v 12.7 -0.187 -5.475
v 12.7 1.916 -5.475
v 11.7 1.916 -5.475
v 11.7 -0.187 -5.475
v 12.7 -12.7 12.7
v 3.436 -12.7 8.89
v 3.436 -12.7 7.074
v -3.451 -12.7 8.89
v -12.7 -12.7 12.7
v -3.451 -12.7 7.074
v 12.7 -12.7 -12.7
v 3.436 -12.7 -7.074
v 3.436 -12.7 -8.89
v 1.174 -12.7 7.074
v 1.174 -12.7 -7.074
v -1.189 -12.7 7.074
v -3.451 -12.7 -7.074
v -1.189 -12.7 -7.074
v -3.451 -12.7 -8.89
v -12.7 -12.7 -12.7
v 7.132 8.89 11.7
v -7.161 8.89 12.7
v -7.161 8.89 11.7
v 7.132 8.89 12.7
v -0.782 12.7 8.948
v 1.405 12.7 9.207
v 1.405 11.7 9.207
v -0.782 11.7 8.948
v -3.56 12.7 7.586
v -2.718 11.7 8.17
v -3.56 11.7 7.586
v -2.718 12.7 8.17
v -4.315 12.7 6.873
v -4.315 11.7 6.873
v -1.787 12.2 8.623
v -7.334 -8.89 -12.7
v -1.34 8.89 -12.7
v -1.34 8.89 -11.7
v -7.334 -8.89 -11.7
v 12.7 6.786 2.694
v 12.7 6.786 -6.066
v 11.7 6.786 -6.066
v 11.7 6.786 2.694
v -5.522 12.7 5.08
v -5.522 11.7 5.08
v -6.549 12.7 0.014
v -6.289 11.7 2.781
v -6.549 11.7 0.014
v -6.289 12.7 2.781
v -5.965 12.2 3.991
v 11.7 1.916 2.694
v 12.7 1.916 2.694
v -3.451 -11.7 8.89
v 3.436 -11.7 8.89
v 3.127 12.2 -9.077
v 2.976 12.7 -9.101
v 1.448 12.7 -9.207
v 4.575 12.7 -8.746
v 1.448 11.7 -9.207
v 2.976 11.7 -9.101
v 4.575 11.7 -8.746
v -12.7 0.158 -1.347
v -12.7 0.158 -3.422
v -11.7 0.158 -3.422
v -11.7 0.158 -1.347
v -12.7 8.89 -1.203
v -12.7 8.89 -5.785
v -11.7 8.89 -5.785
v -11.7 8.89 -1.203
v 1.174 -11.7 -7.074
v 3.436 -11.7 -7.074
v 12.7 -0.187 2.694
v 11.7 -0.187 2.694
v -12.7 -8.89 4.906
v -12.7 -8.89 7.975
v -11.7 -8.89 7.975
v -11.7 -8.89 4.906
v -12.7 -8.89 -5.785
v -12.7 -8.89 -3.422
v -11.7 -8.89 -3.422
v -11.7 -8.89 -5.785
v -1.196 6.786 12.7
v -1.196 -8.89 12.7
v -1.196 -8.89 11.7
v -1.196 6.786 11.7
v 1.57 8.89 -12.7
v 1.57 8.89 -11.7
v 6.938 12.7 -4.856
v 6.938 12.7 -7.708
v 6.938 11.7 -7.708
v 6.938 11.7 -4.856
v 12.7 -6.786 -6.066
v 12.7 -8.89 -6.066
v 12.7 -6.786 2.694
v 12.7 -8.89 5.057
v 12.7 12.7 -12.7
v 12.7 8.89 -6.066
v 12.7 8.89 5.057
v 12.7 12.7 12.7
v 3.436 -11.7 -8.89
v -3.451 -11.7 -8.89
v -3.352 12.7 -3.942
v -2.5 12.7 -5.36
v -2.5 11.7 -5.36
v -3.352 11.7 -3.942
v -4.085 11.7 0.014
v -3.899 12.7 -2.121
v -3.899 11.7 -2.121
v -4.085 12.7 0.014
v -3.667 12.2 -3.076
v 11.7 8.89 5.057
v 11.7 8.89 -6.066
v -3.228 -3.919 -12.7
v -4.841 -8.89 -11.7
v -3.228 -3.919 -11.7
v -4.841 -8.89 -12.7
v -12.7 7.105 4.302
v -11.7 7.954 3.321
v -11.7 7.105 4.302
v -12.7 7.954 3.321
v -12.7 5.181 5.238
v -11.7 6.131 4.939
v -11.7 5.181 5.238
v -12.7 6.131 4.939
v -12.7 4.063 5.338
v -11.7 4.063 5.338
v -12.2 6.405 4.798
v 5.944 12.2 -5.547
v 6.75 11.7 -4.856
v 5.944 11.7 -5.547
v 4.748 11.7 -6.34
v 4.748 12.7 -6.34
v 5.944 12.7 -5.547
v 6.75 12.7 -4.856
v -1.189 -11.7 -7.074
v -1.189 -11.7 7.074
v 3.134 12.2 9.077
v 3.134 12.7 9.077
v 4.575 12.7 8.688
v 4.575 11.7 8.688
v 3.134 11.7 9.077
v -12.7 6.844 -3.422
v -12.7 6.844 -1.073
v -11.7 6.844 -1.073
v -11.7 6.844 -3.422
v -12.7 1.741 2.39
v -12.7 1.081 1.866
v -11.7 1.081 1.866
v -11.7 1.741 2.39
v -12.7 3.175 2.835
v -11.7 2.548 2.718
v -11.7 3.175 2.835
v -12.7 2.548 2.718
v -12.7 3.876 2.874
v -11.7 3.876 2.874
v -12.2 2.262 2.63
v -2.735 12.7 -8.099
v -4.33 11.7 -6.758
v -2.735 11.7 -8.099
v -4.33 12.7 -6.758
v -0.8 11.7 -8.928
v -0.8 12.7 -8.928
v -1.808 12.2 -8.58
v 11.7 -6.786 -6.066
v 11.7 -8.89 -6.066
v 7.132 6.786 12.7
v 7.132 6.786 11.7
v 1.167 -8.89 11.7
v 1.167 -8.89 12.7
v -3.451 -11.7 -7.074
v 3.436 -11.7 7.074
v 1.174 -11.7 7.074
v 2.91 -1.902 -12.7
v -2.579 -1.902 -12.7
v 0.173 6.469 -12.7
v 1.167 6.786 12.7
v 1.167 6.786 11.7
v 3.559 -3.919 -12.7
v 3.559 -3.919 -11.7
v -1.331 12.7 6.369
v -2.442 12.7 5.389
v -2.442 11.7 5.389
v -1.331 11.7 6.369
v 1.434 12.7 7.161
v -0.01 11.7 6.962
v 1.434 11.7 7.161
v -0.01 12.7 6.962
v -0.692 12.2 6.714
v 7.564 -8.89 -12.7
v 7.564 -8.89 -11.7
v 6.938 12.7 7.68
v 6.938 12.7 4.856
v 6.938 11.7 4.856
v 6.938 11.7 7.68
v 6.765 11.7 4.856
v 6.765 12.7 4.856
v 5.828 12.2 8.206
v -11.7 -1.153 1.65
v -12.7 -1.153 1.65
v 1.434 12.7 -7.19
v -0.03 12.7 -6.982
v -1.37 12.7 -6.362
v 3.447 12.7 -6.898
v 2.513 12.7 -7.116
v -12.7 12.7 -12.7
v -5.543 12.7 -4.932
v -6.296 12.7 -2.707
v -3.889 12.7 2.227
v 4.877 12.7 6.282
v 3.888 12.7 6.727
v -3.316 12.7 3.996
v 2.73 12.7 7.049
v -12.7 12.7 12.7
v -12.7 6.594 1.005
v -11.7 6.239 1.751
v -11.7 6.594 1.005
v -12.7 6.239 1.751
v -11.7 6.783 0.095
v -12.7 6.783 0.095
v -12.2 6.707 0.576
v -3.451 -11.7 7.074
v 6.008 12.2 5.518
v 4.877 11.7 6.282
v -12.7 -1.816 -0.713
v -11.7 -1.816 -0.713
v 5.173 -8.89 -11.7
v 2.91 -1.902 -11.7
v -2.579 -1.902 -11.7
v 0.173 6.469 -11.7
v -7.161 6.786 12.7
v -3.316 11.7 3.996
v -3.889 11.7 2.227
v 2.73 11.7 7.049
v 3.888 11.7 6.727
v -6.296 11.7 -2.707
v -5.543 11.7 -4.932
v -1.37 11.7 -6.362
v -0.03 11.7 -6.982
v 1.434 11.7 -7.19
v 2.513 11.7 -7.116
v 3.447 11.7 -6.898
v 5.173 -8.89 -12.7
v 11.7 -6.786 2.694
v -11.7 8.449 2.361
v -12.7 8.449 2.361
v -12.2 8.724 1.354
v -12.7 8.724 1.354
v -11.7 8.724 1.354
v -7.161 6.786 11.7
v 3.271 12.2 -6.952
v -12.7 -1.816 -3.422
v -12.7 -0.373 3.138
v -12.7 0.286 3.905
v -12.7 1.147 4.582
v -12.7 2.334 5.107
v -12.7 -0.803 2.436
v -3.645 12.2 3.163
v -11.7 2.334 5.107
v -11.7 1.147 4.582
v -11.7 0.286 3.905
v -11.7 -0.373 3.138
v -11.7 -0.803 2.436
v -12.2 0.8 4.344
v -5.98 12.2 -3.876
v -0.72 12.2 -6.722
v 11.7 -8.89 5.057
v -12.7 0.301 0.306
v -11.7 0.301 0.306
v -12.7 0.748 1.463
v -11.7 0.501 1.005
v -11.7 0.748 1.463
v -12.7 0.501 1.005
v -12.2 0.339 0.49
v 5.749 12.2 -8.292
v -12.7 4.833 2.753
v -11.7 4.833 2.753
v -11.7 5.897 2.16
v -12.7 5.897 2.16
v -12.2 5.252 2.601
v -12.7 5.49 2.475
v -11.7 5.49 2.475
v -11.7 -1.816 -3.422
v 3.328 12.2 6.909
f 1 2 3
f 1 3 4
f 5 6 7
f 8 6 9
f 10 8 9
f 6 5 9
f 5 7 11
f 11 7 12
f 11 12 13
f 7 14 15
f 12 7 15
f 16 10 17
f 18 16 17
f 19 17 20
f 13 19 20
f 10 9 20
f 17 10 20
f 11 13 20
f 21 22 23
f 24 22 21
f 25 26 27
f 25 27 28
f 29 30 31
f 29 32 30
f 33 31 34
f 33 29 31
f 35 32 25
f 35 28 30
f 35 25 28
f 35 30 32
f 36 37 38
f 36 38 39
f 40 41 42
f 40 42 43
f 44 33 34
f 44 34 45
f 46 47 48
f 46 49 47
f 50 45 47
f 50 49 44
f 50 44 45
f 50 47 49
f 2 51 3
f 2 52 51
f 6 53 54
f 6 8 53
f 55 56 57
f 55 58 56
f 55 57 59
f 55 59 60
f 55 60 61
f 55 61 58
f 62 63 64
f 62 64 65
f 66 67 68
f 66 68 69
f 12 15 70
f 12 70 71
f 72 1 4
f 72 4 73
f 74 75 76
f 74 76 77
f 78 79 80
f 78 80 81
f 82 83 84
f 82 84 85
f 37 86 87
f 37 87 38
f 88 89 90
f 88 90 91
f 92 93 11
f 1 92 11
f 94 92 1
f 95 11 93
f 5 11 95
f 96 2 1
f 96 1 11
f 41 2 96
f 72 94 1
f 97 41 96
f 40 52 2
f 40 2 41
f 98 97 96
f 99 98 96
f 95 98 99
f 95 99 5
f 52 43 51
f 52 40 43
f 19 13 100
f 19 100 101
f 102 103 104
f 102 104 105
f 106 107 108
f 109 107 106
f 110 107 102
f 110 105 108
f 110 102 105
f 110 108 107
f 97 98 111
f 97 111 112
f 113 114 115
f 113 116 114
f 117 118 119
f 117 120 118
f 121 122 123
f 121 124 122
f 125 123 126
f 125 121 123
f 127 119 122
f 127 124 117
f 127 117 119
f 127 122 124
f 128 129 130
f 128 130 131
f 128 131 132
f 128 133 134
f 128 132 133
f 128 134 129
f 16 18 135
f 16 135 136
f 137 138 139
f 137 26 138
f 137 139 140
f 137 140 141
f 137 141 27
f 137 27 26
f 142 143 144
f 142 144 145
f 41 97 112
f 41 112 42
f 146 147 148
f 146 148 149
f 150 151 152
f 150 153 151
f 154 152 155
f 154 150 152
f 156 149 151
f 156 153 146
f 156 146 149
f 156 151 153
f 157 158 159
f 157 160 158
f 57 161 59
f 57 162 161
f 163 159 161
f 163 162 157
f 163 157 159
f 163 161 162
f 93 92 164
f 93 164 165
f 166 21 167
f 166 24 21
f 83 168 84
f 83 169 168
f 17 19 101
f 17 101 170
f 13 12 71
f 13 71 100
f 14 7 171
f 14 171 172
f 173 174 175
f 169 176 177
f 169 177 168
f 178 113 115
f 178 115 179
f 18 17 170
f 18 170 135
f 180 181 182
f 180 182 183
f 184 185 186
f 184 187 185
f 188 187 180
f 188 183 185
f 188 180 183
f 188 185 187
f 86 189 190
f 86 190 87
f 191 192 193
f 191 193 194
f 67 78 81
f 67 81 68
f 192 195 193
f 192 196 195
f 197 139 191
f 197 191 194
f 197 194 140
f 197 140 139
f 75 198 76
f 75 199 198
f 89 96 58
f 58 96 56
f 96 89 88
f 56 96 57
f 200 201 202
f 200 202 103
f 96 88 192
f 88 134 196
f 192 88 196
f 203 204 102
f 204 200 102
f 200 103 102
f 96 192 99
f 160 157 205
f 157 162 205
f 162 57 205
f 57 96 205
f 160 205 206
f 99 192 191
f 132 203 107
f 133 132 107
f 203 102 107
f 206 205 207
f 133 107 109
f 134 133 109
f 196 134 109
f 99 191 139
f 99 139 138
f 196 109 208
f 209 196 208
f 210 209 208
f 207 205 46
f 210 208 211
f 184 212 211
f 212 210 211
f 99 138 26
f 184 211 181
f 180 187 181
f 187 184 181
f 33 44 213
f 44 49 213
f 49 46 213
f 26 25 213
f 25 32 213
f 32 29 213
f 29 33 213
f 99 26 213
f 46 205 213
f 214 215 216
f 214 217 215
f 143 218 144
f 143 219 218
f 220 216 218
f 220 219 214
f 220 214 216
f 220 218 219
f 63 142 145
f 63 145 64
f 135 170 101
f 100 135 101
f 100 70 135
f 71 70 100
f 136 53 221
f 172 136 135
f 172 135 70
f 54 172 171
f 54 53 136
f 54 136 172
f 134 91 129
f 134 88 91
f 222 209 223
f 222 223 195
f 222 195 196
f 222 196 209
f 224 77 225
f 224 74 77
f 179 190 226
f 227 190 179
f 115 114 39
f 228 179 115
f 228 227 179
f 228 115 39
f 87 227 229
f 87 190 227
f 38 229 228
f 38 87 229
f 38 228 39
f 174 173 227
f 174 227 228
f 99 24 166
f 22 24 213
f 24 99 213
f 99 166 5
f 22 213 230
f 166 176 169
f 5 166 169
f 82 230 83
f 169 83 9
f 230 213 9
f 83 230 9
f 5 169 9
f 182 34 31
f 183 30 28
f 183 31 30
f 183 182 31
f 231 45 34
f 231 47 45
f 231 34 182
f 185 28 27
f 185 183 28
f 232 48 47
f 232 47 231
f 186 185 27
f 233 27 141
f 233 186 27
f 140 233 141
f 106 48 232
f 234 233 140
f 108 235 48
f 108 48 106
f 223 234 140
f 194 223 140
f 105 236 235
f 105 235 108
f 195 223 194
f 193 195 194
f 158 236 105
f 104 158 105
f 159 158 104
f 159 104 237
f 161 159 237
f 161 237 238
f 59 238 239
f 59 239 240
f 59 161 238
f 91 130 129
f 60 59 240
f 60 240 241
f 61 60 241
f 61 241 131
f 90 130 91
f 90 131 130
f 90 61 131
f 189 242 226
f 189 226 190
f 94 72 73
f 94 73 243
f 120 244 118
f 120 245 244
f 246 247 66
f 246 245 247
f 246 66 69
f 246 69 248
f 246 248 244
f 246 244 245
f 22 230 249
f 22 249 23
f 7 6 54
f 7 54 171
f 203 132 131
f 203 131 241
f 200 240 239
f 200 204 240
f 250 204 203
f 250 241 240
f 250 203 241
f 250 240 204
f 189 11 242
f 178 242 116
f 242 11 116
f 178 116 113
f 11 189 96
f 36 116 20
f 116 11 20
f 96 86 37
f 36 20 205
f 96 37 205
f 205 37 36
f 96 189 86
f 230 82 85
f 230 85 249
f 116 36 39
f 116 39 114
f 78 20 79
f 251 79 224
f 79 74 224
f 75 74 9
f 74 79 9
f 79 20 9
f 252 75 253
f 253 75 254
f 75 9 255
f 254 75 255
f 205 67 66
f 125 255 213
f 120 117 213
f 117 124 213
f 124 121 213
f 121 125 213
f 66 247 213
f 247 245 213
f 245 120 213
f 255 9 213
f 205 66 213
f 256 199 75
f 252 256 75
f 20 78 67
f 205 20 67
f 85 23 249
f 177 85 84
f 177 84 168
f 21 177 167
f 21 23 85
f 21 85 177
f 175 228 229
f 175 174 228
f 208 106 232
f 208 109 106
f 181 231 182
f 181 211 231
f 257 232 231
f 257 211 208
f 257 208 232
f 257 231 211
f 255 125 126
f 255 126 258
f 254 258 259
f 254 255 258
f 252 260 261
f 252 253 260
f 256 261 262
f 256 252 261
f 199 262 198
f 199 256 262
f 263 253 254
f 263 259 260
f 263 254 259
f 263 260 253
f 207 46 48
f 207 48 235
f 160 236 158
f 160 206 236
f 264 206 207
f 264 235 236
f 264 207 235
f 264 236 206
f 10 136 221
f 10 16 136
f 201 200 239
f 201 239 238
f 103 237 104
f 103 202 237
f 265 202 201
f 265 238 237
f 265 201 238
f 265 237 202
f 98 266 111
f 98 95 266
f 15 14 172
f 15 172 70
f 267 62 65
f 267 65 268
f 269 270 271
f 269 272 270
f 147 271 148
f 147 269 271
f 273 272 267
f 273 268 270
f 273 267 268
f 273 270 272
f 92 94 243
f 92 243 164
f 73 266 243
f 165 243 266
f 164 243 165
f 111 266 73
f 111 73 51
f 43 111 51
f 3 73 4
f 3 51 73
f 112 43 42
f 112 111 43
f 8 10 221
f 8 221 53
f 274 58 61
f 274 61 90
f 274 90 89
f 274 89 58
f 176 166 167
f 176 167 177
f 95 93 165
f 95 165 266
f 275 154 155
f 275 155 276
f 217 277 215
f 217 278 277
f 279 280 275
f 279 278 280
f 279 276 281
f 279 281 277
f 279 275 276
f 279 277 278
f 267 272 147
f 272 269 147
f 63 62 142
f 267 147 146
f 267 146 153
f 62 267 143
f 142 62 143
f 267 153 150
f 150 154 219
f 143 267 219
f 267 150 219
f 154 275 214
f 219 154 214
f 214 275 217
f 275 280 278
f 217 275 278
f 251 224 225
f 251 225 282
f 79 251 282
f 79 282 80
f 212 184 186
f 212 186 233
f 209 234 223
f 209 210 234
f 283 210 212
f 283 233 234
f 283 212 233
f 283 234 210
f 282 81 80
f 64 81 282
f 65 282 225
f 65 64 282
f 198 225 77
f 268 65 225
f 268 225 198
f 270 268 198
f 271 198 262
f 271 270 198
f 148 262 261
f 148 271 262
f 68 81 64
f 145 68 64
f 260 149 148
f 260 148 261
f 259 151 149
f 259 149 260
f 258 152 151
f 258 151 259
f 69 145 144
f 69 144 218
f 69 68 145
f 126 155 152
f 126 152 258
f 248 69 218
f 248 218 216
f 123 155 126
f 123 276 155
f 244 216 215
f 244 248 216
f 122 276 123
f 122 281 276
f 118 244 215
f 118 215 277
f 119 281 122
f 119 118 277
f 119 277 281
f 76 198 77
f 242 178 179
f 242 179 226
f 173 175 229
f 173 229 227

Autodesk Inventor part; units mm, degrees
ref_plane "YZ Plane" through (0, 0, 0) normal (1, 0, 0) x (0, 1, 0)
ref_plane "XZ Plane" through (0, 0, 0) normal (0, 1, 0) x (-1, 0, 0)
ref_plane "XY Plane" through (0, 0, 0) normal (0, 0, 1) x (1, 0, 0)
sketch "sqr_sketch" plane through (0, 0, 0) normal (1, 0, 0) x (0, 1, 0)
  line L0 (12.7, 12.7) -> (-12.7, 12.7)
  line L1 (-12.7, 12.7) -> (-12.7, -12.7)
  line L2 (-12.7, -12.7) -> (12.7, -12.7)
  line L3 (12.7, -12.7) -> (12.7, 12.7)
  line L4 (12.7, 12.7) -> (-12.7, -12.7) construction
  line L5 (-12.7, 12.7) -> (12.7, -12.7) construction
  point P0 (0, 0)
  dimension "d0" = 25.4
extrude "sqr_extrusion" add sketch "sqr_sketch" along normal mid plane 25.4
sketch "T_sketch" plane through (-12.7, -12.7, 12.7) normal (0, 0, 1) x (1, 0, 0)
  line L0 (5.5534, 21.59) -> (19.8466, 21.59) construction
  line L1 (19.8466, 21.59) -> (19.8466, 3.81) construction
  line L2 (19.8466, 3.81) -> (5.5534, 3.81) construction
  line L3 (5.5534, 3.81) -> (5.5534, 21.59) construction
  line L4 (12.7, 21.59) -> (12.7, 3.81) construction
  line L5 (11.5041, 3.81) -> (11.5041, 19.4864)
  line L6 (11.5041, 19.4864) -> (5.539, 19.4864)
  line L7 (5.539, 19.4864) -> (5.539, 21.59)
  line L8 (5.539, 21.59) -> (19.8322, 21.59)
  line L9 (19.8322, 21.59) -> (19.8322, 19.4864)
  line L10 (19.8322, 19.4864) -> (13.8671, 19.4864)
  line L11 (13.8671, 19.4864) -> (13.8671, 3.81)
  line L12 (13.8671, 3.81) -> (11.5041, 3.81)
  point P0 (12.7, 12.7)
  point P1 (12.7, 12.7)
  point P2 (5.5534, 12.7)
  point P3 (19.8466, 12.7)
  dimension "d17" = 17.78
  dimension "d18" = 14.2932
extrude "T_extrusion" cut sketch "T_sketch" against normal blind 1
sketch "E_sketch" plane through (12.7, 0, 0) normal (1, 0, 0) x (0, 0, -1)
  line L0 (-6.8584, 8.89) -> (6.8584, 8.89) construction
  line L1 (6.8584, 8.89) -> (6.8584, -8.89) construction
  line L2 (6.8584, -8.89) -> (-6.8584, -8.89) construction
  line L3 (-6.8584, -8.89) -> (-6.8584, 8.89) construction
  line L4 (0, 8.89) -> (0, -8.89) construction
  line L5 (-5.0574, -8.89) -> (-5.0574, 8.89)
  line L6 (-5.0574, 8.89) -> (6.0659, 8.89)
  line L7 (6.0659, 8.89) -> (6.0659, 6.7864)
  line L8 (6.0659, 6.7864) -> (-2.6944, 6.7864)
  line L9 (-2.6944, 6.7864) -> (-2.6944, 1.9163)
  line L10 (-2.6944, 1.9163) -> (5.4752, 1.9163)
  line L11 (5.4752, 1.9163) -> (5.4752, -0.1873)
  line L12 (5.4752, -0.1873) -> (-2.6944, -0.1873)
  line L13 (-2.6944, -0.1873) -> (-2.6944, -6.7864)
  line L14 (-2.6944, -6.7864) -> (6.0659, -6.7864)
  line L15 (6.0659, -6.7864) -> (6.0659, -8.89)
  line L16 (6.0659, -8.89) -> (-5.0574, -8.89)
  point P0 (0, 0)
  point P1 (0, 0)
  point P2 (-6.8584, 0)
  point P3 (6.8584, 0)
  dimension "d15" = 17.78
  dimension "d16" = 13.7168
extrude "E_extrusion" cut sketch "E_sketch" against normal blind 1
sketch "A_sketch" plane through (12.7, 12.7, -12.7) normal (0, 0, -1) x (-1, 0, 0)
  line L0 (5.2508, -3.81) -> (20.1492, -3.81) construction
  line L1 (20.1492, -3.81) -> (20.1492, -21.59) construction
  line L2 (20.1492, -21.59) -> (5.2508, -21.59) construction
  line L3 (5.2508, -21.59) -> (5.2508, -3.81) construction
  line L4 (12.7, -3.81) -> (12.7, -21.59) construction
  line L5 (5.1356, -21.59) -> (11.1295, -3.81)
  line L6 (11.1295, -3.81) -> (14.04, -3.81)
  line L7 (14.04, -3.81) -> (20.0339, -21.59)
  line L8 (20.0339, -21.59) -> (17.5412, -21.59)
  line L9 (17.5412, -21.59) -> (15.9275, -16.6191)
  line L10 (15.9275, -16.6191) -> (9.1411, -16.6191)
  line L11 (9.1411, -16.6191) -> (7.5274, -21.59)
  line L12 (7.5274, -21.59) -> (5.1356, -21.59)
  line L13 (15.2791, -14.6019) -> (12.5271, -6.2306)
  line L14 (12.5271, -6.2306) -> (9.7895, -14.6019)
  line L15 (9.7895, -14.6019) -> (15.2791, -14.6019)
  point P0 (12.7, -12.7)
  point P1 (5.2508, -12.7)
  point P2 (20.1492, -12.7)
  point P3 (12.7, -12.7)
  dimension "d19" = 17.78
  dimension "d20" = 14.8983
extrude "A_extrusion" cut sketch "A_sketch" against normal blind 1
sketch "R_sketch" plane through (-12.7, 0, 0) normal (-1, 0, 0) x (0, 0, 1)
  line L0 (-7.586, 8.89) -> (7.586, 8.89) construction
  line L1 (7.586, 8.89) -> (7.586, -8.89) construction
  line L2 (7.586, -8.89) -> (-7.586, -8.89) construction
  line L3 (-7.586, -8.89) -> (-7.586, 8.89) construction
  line L4 (0, 8.89) -> (0, -8.89) construction
  line L5 (7.9751, -8.89) -> (4.9061, -8.89)
  line L6 (4.9061, -8.89) -> (-0.7132, -1.8155)
  line L7 (-0.7132, -1.8155) -> (-3.422, -1.8155)
  line L8 (-3.422, -1.8155) -> (-3.422, -8.89)
  line L9 (-3.422, -8.89) -> (-5.785, -8.89)
  line L10 (-5.785, -8.89) -> (-5.785, 8.89)
  line L11 (-5.785, 8.89) -> (-1.2031, 8.89)
  spline S0 degree 2 poles (-1.2031, 8.89) (0.3242, 8.89) (2.3846, 8.5586) (3.3211, 7.9535) knots 0 0 0 1 2 2 2
  spline S1 degree 2 poles (3.3211, 7.9535) (4.2577, 7.3483) (5.3383, 5.4608) (5.3383, 4.0632) knots 0 0 0 1 2 2 2
  spline S2 degree 2 poles (5.3383, 4.0632) (5.3383, 2.118) (3.35, -0.5187) (1.6498, -1.1527) knots 0 0 0 1 2 2 2
  line L12 (1.6498, -1.1527) -> (7.9751, -8.89)
  spline S3 degree 2 poles (2.8745, 3.8759) (2.8745, 4.6539) (2.327, 5.8498) (1.7506, 6.2388) knots 0 0 0 1 2 2 2
  spline S4 degree 2 poles (1.7506, 6.2388) (1.2463, 6.5702) (-0.0937, 6.844) (-1.0734, 6.844) knots 0 0 0 1 2 2 2
  line L13 (-1.0734, 6.844) -> (-3.422, 6.844)
  line L14 (-3.422, 6.844) -> (-3.422, 0.1585)
  line L15 (-3.422, 0.1585) -> (-1.3472, 0.1585)
  spline S5 degree 2 poles (-1.3472, 0.1585) (-0.3242, 0.1585) (1.304, 0.5187) (1.8659, 1.0806) knots 0 0 0 1 2 2 2
  spline S6 degree 2 poles (1.8659, 1.0806) (2.3846, 1.5705) (2.8745, 2.9537) (2.8745, 3.8759) knots 0 0 0 1 2 2 2
  point P0 (0, 0)
  point P1 (0, 0)
  point P2 (-7.586, 0)
  point P3 (7.586, 0)
  dimension "d21" = 17.78
  dimension "d22" = 15.1721
extrude "R_extrusion" cut sketch "R_sketch" against normal blind 1
sketch "C_sketch" plane through (-12.7, 12.7, 12.7) normal (0, 1, 0) x (1, 0, 0)
  line L0 (5.3589, 21.907) -> (20.0411, 21.907) construction
  line L1 (20.0411, 21.907) -> (20.0411, 3.493) construction
  line L2 (20.0411, 3.493) -> (5.3589, 3.493) construction
  line L3 (5.3589, 3.493) -> (5.3589, 21.907) construction
  line L4 (12.7, 21.907) -> (12.7, 3.493) construction
  spline S0 degree 2 poles (14.1048, 3.493) (12.3758, 3.493) (9.4509, 4.6601) (8.3847, 5.8272) knots 0 0 0 1 2 2 2
  spline S1 degree 2 poles (8.3847, 5.8272) (7.3185, 6.9799) (6.1514, 10.4379) (6.1514, 12.6856) knots 0 0 0 1 2 2 2
  spline S2 degree 2 poles (6.1514, 12.6856) (6.1514, 14.9189) (7.2896, 18.2328) (8.3703, 19.4576) knots 0 0 0 1 2 2 2
  spline S3 degree 2 poles (8.3703, 19.4576) (9.4365, 20.6535) (12.347, 21.907) (14.148, 21.907) knots 0 0 0 1 2 2 2
  spline S4 degree 2 poles (14.148, 21.907) (15.0414, 21.907) (16.6119, 21.6476) (17.2747, 21.4459) knots 0 0 0 1 2 2 2
  spline S5 degree 2 poles (17.2747, 21.4459) (17.851, 21.2586) (19.0469, 20.7255) (19.6377, 20.4085) knots 0 0 0 1 2 2 2
  line L5 (19.6377, 20.4085) -> (19.6377, 17.5556)
  line L6 (19.6377, 17.5556) -> (19.4503, 17.5556)
  spline S6 degree 2 poles (19.4503, 17.5556) (19.1334, 17.8438) (18.1536, 18.6507) (17.4476, 19.0397) knots 0 0 0 1 2 2 2
  spline S7 degree 2 poles (17.4476, 19.0397) (16.7704, 19.4143) (15.171, 19.8898) (14.1336, 19.8898) knots 0 0 0 1 2 2 2
  spline S8 degree 2 poles (14.1336, 19.8898) (12.9954, 19.8898) (10.9638, 18.9533) (10.2001, 18.0599) knots 0 0 0 1 2 2 2
  spline S9 degree 2 poles (10.2001, 18.0599) (9.4509, 17.1522) (8.6152, 14.4002) (8.6152, 12.6856) knots 0 0 0 1 2 2 2
  spline S10 degree 2 poles (8.6152, 12.6856) (8.6152, 10.8557) (9.4941, 8.219) (10.2578, 7.3112) knots 0 0 0 1 2 2 2
  spline S11 degree 2 poles (10.2578, 7.3112) (11.007, 6.4323) (13.0098, 5.539) (14.1336, 5.539) knots 0 0 0 1 2 2 2
  spline S12 degree 2 poles (14.1336, 5.539) (15.1566, 5.539) (16.9001, 6.0433) (17.5773, 6.4179) knots 0 0 0 1 2 2 2
  spline S13 degree 2 poles (17.5773, 6.4179) (18.2256, 6.7925) (19.191, 7.5706) (19.4648, 7.8444) knots 0 0 0 1 2 2 2
  line L7 (19.4648, 7.8444) -> (19.6377, 7.8444)
  line L8 (19.6377, 7.8444) -> (19.6377, 5.0203)
  spline S14 degree 2 poles (19.6377, 5.0203) (19.0469, 4.7465) (18.0095, 4.2423) (17.2747, 4.0117) knots 0 0 0 1 2 2 2
  spline S15 degree 2 poles (17.2747, 4.0117) (16.4966, 3.7524) (15.171, 3.493) (14.1048, 3.493) knots 0 0 0 1 2 2 2
  point P0 (12.7, 12.7)
  point P1 (5.3589, 12.7)
  point P2 (20.0411, 12.7)
  point P3 (12.7, 12.7)
  dimension "d23" = 18.414
  dimension "d24" = 14.6822
extrude "C_extrusion" cut sketch "C_sketch" against normal blind 1
sketch "I_sketch" plane through (-12.7, -12.7, -12.7) normal (0, -1, 0) x (1, 0, 0)
  line L0 (8.1397, 21.59) -> (17.2603, 21.59) construction
  line L1 (17.2603, 21.59) -> (17.2603, 3.81) construction
  line L2 (17.2603, 3.81) -> (8.1397, 3.81) construction
  line L3 (8.1397, 3.81) -> (8.1397, 21.59) construction
  line L4 (12.7, 3.81) -> (12.7, 21.59) construction
  line L5 (16.1364, 3.81) -> (9.2492, 3.81)
  line L6 (9.2492, 3.81) -> (9.2492, 5.6255)
  line L7 (9.2492, 5.6255) -> (11.5113, 5.6255)
  line L8 (11.5113, 5.6255) -> (11.5113, 19.7745)
  line L9 (11.5113, 19.7745) -> (9.2492, 19.7745)
  line L10 (9.2492, 19.7745) -> (9.2492, 21.59)
  line L11 (9.2492, 21.59) -> (16.1364, 21.59)
  line L12 (16.1364, 21.59) -> (16.1364, 19.7745)
  line L13 (16.1364, 19.7745) -> (13.8743, 19.7745)
  line L14 (13.8743, 19.7745) -> (13.8743, 5.6255)
  line L15 (13.8743, 5.6255) -> (16.1364, 5.6255)
  line L16 (16.1364, 5.6255) -> (16.1364, 3.81)
  point P0 (12.7, 12.7)
  point P1 (17.2603, 12.7)
  point P2 (8.1397, 12.7)
  point P3 (12.7, 12.7)
  dimension "d25" = 17.78
  dimension "d26" = 9.1205
extrude "I_extrusion" cut sketch "I_sketch" against normal blind 1
equation "\"d1\" = d0"
properties part number "Cubo" material "Rubber"
